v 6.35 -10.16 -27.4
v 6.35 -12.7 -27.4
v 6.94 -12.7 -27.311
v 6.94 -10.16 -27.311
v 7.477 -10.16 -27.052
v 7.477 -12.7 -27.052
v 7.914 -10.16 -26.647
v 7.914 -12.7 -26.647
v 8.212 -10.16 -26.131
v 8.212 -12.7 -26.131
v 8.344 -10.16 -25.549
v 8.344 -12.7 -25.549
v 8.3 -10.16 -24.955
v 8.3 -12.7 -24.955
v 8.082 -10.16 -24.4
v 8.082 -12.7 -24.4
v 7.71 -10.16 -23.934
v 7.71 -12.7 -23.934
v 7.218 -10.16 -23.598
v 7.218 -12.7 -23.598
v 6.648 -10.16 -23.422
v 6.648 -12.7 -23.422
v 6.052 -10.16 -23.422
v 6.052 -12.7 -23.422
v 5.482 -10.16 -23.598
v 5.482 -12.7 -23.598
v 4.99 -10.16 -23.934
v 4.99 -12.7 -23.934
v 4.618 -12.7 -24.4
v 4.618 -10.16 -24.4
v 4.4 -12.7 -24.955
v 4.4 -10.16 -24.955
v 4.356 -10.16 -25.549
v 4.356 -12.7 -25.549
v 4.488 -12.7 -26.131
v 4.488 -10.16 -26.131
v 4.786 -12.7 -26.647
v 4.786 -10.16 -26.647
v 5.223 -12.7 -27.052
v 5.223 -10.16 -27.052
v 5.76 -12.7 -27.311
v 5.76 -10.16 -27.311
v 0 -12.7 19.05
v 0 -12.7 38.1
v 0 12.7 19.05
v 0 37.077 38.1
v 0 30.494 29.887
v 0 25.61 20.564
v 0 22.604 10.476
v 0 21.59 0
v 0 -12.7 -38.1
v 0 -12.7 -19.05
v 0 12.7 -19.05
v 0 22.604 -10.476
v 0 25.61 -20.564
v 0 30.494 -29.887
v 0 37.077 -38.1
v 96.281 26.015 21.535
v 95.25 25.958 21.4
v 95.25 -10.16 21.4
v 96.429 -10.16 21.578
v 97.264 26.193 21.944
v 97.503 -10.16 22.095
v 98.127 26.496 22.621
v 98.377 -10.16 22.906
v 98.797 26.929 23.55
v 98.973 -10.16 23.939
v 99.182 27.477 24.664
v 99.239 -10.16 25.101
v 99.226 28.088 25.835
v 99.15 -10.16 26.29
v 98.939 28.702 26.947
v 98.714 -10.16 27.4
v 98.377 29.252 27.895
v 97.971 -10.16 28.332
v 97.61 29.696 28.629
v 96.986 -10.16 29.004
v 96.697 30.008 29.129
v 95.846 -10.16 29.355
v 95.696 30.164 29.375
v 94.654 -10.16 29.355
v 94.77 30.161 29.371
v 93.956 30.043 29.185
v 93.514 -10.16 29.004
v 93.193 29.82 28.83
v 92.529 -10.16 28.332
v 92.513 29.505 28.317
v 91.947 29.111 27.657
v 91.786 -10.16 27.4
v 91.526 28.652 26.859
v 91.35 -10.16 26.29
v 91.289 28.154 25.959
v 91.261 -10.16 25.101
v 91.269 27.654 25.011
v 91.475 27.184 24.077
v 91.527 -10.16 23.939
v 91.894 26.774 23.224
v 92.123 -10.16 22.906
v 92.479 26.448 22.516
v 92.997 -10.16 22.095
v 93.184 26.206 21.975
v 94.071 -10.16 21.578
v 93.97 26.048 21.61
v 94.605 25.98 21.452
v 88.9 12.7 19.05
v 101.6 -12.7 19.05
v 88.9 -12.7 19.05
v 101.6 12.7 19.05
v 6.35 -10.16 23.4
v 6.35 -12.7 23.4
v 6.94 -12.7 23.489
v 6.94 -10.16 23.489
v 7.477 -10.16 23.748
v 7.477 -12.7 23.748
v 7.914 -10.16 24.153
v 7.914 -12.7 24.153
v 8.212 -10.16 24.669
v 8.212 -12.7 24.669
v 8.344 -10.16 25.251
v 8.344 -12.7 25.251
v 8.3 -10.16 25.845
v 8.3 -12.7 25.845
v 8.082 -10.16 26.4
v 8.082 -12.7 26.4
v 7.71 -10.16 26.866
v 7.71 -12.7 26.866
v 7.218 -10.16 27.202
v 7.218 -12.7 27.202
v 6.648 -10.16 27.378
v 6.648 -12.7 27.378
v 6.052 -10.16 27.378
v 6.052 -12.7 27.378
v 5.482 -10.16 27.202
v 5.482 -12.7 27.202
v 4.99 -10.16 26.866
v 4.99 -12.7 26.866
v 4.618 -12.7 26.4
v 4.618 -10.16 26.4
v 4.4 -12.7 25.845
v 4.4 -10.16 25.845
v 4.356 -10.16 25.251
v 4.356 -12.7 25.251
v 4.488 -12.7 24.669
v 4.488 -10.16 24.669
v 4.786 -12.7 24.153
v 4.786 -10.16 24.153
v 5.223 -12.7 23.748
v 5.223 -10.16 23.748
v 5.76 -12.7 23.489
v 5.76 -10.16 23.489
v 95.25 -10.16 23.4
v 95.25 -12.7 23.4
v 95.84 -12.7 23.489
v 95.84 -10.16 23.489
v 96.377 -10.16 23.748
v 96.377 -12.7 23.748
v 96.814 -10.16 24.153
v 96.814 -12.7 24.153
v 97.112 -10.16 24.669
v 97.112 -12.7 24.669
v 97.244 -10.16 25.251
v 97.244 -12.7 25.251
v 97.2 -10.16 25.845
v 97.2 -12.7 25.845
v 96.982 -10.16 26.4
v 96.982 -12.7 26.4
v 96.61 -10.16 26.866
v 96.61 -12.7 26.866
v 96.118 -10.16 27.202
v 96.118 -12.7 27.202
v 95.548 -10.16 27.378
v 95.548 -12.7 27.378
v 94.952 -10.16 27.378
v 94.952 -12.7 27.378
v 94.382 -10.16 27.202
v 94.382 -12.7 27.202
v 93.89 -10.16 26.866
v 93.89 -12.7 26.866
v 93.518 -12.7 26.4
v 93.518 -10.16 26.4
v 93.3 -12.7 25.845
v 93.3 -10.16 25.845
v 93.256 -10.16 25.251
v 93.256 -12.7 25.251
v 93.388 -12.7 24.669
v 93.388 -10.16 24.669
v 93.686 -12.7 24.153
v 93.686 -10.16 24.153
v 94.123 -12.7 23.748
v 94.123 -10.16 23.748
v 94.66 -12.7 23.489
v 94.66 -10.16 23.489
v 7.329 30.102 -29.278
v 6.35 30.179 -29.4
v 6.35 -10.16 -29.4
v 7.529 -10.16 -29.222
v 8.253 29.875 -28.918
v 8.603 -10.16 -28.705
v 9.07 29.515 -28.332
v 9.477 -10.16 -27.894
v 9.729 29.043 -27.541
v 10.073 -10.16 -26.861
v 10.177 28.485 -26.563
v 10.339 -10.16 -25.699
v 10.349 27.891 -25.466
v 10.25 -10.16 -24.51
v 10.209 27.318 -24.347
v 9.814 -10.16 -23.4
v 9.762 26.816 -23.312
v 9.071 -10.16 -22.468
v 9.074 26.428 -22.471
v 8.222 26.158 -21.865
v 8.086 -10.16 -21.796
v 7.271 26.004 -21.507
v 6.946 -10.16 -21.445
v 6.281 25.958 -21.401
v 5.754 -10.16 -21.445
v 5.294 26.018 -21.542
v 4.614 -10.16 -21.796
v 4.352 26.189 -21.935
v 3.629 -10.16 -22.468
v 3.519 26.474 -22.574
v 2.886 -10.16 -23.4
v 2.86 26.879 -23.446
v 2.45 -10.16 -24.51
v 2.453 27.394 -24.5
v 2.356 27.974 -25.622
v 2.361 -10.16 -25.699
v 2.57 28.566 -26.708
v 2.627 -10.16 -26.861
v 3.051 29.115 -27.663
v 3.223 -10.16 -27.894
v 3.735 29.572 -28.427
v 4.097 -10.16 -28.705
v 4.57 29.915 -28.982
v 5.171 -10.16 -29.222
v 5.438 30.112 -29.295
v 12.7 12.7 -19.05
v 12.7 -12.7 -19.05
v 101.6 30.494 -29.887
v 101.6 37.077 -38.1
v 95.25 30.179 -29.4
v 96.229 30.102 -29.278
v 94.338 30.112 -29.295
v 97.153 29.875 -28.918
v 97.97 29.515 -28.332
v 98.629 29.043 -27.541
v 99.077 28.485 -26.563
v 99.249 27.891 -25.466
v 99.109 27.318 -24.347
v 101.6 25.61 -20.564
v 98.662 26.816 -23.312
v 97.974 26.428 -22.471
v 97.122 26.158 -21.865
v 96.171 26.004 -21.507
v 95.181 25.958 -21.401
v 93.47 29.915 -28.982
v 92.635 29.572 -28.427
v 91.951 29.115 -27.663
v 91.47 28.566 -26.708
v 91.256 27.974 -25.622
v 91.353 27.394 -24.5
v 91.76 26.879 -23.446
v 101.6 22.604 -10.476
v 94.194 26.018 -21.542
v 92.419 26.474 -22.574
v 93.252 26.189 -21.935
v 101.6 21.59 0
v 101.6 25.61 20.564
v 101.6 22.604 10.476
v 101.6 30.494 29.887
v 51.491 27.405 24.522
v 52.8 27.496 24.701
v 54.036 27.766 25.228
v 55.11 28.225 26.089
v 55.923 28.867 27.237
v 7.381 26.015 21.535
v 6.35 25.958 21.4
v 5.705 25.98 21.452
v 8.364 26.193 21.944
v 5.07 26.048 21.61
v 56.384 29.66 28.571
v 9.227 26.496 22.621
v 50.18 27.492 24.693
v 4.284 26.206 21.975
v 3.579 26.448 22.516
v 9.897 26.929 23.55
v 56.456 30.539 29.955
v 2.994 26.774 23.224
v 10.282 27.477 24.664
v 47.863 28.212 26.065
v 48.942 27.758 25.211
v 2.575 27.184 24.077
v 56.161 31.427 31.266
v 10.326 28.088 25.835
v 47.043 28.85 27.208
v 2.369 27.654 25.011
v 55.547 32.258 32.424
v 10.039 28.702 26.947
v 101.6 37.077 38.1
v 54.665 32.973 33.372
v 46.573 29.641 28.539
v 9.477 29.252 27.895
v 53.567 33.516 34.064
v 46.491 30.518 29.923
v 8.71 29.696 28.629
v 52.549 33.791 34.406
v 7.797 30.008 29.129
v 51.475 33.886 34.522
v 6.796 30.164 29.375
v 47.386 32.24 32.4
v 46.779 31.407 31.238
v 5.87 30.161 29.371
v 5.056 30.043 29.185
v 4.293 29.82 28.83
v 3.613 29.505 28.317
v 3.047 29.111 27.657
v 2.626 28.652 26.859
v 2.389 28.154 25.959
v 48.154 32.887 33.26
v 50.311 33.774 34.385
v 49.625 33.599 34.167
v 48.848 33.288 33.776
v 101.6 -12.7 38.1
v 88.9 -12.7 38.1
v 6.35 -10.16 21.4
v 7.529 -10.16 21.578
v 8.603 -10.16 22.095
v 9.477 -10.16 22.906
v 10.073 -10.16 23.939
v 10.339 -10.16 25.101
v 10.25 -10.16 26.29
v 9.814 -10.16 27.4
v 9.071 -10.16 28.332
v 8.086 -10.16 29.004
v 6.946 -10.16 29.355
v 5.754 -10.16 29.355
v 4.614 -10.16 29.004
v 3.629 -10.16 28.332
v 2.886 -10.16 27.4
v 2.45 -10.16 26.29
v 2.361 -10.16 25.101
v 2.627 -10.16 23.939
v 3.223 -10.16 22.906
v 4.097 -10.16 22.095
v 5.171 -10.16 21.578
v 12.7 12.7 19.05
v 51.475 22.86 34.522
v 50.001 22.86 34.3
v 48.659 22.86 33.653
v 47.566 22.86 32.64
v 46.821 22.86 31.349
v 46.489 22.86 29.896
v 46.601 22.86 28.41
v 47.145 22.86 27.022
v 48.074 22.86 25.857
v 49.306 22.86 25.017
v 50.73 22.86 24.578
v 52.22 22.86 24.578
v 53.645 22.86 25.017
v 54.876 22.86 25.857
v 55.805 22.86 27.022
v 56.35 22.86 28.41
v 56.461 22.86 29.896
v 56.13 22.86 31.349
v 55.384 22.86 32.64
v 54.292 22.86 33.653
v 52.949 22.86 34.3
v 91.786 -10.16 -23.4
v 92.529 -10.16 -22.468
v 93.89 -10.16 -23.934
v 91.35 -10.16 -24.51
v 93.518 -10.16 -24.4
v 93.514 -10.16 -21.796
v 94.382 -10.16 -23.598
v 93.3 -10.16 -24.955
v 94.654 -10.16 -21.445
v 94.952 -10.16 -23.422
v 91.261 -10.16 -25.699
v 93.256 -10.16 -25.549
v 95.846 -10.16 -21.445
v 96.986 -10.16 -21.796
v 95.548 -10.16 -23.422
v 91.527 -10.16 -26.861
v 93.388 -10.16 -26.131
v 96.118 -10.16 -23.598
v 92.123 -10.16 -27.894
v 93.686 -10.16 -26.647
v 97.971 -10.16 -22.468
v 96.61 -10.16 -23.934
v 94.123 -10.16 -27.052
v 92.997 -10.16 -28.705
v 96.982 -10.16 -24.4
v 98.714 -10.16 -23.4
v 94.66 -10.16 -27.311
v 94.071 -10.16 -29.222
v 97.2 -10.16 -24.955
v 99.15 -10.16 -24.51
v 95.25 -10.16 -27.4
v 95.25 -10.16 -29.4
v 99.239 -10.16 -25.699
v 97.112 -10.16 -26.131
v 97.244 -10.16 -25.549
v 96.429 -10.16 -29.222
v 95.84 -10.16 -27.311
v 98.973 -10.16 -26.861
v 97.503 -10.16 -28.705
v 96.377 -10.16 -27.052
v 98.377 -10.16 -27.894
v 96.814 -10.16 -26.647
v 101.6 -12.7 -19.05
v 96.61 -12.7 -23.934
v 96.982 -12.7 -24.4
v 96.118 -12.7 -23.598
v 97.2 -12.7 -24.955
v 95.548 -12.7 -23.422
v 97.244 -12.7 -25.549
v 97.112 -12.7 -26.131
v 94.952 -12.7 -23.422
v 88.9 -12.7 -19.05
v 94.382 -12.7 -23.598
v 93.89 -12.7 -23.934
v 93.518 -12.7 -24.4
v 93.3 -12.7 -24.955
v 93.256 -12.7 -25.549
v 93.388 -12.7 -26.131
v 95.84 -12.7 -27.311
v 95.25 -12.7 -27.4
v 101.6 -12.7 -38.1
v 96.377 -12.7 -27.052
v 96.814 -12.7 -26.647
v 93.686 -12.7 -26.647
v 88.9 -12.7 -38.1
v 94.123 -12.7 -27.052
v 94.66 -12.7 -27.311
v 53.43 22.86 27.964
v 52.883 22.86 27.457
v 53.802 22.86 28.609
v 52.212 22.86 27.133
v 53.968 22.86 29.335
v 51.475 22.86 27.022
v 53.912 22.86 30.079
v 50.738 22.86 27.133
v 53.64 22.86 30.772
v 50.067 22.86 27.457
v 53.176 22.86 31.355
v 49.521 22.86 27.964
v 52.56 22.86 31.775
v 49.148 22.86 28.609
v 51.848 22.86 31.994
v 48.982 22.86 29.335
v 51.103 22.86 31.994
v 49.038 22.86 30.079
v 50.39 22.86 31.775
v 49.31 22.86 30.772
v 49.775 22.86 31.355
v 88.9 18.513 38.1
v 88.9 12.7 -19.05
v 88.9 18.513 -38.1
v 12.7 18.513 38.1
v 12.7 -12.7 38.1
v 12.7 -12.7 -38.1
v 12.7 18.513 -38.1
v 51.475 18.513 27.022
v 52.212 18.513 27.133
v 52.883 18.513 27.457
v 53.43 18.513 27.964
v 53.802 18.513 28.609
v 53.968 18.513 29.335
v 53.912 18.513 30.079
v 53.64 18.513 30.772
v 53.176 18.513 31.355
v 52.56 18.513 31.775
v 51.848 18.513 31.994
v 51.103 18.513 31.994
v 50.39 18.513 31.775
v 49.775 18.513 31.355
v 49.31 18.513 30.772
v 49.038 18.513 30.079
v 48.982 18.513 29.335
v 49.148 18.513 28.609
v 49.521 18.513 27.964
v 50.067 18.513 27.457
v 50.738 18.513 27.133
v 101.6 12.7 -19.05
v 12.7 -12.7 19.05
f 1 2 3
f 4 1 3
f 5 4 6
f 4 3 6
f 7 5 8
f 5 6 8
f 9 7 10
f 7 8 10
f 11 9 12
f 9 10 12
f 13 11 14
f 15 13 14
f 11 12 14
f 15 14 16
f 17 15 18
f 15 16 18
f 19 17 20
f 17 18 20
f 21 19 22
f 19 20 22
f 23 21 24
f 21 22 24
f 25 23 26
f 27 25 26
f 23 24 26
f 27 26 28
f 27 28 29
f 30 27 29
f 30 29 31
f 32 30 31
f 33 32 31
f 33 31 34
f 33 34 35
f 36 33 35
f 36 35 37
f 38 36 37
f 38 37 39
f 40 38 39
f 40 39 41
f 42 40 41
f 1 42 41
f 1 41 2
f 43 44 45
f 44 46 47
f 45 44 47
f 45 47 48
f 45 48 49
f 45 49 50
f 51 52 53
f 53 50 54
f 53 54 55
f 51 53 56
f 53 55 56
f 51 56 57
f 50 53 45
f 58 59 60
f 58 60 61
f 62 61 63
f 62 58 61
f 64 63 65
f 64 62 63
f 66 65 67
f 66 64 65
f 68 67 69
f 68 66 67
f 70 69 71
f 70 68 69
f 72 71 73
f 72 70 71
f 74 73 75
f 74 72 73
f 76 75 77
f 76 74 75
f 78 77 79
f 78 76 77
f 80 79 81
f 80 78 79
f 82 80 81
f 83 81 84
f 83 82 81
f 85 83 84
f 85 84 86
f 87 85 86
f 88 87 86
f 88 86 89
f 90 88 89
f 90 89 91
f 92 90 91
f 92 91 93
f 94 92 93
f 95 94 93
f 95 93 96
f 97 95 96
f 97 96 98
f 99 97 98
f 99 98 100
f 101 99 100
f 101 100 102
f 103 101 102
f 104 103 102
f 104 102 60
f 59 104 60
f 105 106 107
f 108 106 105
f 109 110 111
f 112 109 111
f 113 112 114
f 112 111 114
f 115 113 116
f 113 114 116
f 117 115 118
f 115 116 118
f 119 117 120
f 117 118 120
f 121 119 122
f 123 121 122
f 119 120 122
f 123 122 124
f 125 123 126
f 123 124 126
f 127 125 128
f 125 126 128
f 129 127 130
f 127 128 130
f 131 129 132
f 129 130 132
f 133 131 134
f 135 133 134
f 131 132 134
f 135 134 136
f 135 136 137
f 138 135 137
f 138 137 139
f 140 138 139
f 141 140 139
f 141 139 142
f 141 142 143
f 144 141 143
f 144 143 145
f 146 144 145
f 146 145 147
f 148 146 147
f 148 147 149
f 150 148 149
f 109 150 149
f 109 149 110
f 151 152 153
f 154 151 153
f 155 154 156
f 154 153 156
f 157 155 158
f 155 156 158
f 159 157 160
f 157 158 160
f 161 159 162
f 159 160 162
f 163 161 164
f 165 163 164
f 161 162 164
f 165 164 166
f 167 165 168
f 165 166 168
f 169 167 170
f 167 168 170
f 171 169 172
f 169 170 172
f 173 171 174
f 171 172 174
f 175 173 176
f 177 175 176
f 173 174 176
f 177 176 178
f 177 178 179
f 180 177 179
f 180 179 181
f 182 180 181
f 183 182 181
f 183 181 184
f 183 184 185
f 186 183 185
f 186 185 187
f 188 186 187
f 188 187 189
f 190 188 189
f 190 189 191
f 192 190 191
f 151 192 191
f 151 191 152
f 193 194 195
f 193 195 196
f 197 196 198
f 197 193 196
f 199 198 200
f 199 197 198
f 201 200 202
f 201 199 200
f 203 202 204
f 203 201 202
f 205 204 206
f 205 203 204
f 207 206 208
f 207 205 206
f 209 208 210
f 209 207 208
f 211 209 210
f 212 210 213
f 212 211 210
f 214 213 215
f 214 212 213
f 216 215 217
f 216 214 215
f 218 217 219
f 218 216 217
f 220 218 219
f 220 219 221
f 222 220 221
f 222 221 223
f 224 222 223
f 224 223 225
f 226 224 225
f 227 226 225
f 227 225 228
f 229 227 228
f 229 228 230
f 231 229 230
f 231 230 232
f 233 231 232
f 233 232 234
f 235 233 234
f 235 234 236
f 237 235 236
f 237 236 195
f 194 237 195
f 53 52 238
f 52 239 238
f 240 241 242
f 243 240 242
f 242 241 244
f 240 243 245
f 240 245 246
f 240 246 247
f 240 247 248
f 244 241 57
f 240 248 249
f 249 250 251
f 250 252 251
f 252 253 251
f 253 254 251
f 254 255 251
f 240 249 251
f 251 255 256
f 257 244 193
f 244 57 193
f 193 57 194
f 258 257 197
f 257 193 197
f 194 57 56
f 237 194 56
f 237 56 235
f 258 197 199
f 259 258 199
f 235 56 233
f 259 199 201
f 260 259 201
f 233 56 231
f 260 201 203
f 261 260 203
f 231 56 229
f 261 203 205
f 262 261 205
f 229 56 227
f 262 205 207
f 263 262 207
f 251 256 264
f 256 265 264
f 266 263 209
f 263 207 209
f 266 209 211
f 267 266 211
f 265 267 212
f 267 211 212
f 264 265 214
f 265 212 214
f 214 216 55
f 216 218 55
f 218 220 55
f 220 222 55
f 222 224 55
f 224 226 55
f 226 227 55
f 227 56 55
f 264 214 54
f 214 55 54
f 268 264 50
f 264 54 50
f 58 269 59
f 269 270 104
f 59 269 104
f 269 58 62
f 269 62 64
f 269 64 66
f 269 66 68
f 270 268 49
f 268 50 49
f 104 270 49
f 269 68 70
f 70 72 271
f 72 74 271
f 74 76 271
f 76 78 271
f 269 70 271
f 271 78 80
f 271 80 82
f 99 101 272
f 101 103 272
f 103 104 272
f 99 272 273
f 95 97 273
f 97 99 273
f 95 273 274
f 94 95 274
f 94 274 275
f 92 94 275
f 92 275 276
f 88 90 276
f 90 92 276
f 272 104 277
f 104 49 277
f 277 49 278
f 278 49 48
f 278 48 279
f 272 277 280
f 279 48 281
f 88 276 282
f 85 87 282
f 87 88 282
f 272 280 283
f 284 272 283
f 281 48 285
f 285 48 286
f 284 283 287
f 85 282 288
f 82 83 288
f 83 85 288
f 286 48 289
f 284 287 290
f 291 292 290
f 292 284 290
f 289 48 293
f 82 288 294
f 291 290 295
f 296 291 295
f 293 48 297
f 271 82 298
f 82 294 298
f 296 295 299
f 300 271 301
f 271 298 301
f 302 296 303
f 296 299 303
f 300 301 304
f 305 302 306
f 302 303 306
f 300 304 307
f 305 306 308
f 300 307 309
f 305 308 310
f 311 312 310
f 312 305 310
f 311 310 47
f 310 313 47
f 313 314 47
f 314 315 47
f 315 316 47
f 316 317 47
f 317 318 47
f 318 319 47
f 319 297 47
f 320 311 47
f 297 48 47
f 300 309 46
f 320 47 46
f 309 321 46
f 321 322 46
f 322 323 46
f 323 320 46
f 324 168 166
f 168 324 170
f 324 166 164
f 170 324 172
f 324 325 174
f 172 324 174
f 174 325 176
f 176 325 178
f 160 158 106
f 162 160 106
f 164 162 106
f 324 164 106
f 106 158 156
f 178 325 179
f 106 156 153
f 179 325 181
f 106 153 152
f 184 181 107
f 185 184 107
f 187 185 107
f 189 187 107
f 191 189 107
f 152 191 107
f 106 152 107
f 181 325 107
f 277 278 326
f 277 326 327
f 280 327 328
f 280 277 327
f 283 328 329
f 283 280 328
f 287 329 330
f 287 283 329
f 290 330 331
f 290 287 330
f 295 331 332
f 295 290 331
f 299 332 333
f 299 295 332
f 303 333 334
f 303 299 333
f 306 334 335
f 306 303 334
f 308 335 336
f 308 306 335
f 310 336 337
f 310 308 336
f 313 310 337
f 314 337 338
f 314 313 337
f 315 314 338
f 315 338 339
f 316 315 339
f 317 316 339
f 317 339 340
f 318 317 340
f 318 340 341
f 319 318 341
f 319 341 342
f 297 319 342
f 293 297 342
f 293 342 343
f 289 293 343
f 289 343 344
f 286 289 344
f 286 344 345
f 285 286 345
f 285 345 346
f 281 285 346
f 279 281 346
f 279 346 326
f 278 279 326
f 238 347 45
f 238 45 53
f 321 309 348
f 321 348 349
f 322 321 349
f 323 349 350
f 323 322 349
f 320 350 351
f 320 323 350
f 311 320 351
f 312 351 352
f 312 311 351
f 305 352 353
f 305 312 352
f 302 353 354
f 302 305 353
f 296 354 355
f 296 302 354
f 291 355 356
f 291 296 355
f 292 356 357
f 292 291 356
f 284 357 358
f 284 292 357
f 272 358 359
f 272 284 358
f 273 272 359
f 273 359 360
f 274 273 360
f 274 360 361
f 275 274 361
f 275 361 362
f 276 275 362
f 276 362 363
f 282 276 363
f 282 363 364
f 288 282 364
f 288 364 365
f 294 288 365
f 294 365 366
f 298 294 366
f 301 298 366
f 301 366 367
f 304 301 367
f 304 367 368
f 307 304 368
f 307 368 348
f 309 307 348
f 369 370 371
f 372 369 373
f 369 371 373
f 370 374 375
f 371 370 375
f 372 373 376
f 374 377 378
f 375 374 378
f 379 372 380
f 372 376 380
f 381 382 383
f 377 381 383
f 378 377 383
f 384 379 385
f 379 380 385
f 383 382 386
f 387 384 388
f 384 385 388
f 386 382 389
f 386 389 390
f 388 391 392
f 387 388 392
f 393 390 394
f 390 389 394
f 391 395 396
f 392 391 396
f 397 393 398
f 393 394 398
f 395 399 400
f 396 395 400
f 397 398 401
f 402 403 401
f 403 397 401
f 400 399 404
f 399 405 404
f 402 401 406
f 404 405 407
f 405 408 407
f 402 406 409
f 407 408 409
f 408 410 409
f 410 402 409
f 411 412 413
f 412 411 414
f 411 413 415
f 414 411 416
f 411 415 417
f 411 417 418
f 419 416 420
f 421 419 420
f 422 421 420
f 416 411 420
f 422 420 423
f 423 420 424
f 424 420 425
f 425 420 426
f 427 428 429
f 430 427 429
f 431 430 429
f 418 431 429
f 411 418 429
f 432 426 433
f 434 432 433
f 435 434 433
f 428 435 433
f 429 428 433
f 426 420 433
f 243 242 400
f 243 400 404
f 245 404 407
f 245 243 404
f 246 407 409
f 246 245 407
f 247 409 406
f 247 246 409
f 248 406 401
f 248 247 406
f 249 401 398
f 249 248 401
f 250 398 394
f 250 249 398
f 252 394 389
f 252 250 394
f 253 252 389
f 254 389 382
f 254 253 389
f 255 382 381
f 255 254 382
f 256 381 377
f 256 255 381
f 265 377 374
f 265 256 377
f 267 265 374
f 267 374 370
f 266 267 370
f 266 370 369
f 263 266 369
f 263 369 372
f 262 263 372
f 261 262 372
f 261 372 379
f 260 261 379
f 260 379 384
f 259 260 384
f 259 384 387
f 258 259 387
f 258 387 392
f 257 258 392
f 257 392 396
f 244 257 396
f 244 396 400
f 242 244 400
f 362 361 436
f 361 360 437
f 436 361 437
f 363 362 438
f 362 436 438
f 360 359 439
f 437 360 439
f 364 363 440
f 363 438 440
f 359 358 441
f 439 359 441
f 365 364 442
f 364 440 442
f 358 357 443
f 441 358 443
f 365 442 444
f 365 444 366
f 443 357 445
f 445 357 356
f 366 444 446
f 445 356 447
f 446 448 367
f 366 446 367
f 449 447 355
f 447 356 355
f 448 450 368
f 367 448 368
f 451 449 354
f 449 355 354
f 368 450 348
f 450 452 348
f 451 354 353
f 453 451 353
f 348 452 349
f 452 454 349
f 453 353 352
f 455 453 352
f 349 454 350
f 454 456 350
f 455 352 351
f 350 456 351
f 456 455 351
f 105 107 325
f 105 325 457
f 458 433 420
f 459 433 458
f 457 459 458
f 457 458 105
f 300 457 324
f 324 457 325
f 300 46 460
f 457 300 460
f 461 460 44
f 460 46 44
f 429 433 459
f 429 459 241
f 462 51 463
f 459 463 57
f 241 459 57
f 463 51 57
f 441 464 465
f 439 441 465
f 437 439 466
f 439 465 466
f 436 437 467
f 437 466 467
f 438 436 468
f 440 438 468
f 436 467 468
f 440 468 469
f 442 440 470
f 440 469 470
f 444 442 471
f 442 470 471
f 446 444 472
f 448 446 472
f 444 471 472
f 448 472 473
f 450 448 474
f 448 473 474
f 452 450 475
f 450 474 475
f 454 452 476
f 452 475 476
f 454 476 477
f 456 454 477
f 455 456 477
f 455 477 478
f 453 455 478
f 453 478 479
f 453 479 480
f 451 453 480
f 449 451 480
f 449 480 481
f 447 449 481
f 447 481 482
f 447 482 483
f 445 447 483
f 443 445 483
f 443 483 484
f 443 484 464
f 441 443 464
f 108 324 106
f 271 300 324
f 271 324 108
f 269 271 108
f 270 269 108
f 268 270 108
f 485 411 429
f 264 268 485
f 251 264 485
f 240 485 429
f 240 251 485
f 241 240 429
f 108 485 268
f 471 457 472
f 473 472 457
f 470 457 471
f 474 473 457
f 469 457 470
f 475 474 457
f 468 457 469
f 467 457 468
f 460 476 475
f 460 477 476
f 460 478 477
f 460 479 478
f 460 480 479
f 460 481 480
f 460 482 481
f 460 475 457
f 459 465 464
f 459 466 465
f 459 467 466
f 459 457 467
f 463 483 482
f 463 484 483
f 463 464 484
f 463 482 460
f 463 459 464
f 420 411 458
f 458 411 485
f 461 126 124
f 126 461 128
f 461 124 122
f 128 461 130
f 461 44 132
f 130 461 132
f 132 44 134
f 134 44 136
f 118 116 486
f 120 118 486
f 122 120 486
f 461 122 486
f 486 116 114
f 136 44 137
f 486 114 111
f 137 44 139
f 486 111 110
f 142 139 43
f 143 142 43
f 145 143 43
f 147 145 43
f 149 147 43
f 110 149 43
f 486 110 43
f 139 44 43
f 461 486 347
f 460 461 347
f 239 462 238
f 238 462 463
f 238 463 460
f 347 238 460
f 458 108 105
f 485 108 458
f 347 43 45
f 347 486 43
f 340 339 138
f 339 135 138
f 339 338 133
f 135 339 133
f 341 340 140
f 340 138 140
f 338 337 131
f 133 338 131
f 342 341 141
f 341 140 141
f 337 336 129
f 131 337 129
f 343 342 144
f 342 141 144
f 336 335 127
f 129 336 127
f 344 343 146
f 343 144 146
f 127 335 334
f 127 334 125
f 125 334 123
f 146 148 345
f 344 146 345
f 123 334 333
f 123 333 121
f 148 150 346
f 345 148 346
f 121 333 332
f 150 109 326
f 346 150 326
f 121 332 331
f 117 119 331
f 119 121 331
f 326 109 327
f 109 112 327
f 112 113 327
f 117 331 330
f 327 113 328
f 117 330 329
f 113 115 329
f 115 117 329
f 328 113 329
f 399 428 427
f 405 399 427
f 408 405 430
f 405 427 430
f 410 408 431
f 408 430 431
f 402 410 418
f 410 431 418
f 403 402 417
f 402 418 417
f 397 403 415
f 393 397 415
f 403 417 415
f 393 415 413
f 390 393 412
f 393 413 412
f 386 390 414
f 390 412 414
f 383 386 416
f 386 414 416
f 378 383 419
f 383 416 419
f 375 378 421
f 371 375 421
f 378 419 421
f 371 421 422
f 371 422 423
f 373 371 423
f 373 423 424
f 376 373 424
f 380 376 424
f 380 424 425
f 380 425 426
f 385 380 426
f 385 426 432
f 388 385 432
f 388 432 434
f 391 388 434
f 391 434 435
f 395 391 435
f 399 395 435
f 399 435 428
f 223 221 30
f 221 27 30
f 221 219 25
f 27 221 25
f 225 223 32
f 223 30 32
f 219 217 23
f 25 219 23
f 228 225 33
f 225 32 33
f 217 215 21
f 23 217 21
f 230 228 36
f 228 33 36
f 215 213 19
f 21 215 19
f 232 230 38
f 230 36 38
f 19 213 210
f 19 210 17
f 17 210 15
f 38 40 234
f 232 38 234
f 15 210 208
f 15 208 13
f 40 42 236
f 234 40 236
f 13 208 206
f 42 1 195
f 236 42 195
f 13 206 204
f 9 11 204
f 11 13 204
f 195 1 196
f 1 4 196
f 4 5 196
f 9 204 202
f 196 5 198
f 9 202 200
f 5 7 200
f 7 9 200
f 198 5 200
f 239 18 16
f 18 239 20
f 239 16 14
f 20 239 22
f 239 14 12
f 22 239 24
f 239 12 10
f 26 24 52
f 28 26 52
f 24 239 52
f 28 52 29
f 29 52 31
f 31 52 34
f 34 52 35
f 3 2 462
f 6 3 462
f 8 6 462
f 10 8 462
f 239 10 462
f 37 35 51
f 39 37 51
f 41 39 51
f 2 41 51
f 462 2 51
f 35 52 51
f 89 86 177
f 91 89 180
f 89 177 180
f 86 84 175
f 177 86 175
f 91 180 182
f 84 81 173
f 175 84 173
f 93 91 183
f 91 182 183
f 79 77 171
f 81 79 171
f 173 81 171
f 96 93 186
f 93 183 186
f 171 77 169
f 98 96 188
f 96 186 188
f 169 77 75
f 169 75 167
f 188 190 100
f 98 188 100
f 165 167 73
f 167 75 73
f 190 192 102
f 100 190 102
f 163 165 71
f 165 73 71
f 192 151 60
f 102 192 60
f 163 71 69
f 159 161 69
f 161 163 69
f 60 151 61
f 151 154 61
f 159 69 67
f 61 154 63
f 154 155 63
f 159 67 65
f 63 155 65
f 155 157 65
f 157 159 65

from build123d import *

# Parameters (mm, degrees)
BOSS_EXTRUDE1_DEPTH     = 101.6
SKETCH2_R               = 2
CUT_EXTRUDE1_DEPTH      = 120.381228758
SKETCH3_W               = 76.2
SKETCH3_H               = 62.425931944
CUT_EXTRUDE2_DEPTH      = 133.301446423
BOSS_EXTRUDE2_START     = -76.2
BOSS_EXTRUDE2_DEPTH     = 76.2
CUT_EXTRUDE3_DEPTH      = 27.94
CUT_EXTRUDE3_DEPTH_BACK = 19.05
SKETCH5_R               = 4
SKETCH6_W               = 38.1
SKETCH6_H               = 50.8
CUT_EXTRUDE4_DEPTH      = 115.668403311
SKETCH9_R               = 5
CUT_EXTRUDE6_DEPTH      = 15.24
SKETCH10_R              = 2.5
CUT_EXTRUDE7_DEPTH      = 113.708475404


with BuildPart() as part:
    # Sketch1 → Boss-Extrude1 (new body)
    with BuildSketch(Plane(origin=(0, 0, 0), x_dir=(0, 0, -1), z_dir=(1, 0, 0))):
        with BuildLine():
            Line((-38.1, 37.076578626), (-38.1, -12.7))
            Line((-38.1, -12.7), (38.1, -12.7))
            Line((38.1, -12.7), (38.1, 37.076578626))
            ThreePointArc((38.1, 37.076578626), (0, 21.59), (-38.1, 37.076578626))
        make_face()
    extrude(amount=BOSS_EXTRUDE1_DEPTH)

    # Sketch2 → Cut-Extrude1 (cut, through all)
    with BuildSketch(Plane(origin=(0, -12.7, 0), x_dir=(-1, 0, 0), z_dir=(0, -1, 0))):
        with Locations(Location((-6.35, -25.4, 0), (0, 0, 90))):
            Circle(SKETCH2_R)
        with Locations(Location((-6.35, 25.4, 0), (0, 0, 90))):
            Circle(SKETCH2_R)
        with Locations(Location((-95.25, -25.4, 0), (0, 0, 90))):
            Circle(SKETCH2_R)
        with Locations(Location((-95.25, 25.4, 0), (0, 0, 90))):
            Circle(SKETCH2_R)
    extrude(amount=-CUT_EXTRUDE1_DEPTH, mode=Mode.SUBTRACT)

    # Sketch3 → Cut-Extrude2 (cut, through all)
    with BuildSketch(Plane(origin=(0, 0, -38.1), x_dir=(-1, 0, 0), z_dir=(0, 0, -1))):
        with Locations((-50.8, -12.7)):
            Rectangle(SKETCH3_W, SKETCH3_H)
    extrude(amount=-CUT_EXTRUDE2_DEPTH, mode=Mode.SUBTRACT)

    # Sketch4 → Boss-Extrude2 (add)
    with BuildSketch(Plane(origin=(101.6, 0, 0), x_dir=(0, 0, -1), z_dir=(1, 0, 0)).offset(BOSS_EXTRUDE2_START)):
        with BuildLine():
            Line((-38.1, 37.076578626), (-38.1, 33.602905029))
            ThreePointArc((-38.1, 33.602905029), (0, 19.05), (38.1, 33.602905029))
            Line((38.1, 33.602905029), (38.1, 37.076578626))
            ThreePointArc((38.1, 37.076578626), (0, 21.59), (-38.1, 37.076578626))
        make_face()
    extrude(amount=BOSS_EXTRUDE2_DEPTH)

    # Sketch5 → Cut-Extrude3 (cut, two sides: drawn at the far end of the back side and taken through both)
    with BuildSketch(Plane(origin=(0, 17.78, 0), x_dir=(-1, 0, 0), z_dir=(0, -1, 0)).offset(-CUT_EXTRUDE3_DEPTH_BACK)):
        with Locations(Location((-95.25, 25.4, 0), (0, 0, 90))):
            Circle(SKETCH5_R)
        with Locations(Location((-6.35, 25.4, 0), (0, 0, 90))):
            Circle(SKETCH5_R)
        with Locations(Location((-6.35, -25.4, 0), (0, 0, 90))):
            Circle(SKETCH5_R)
        with Locations(Location((-95.25, -25.4, 0), (0, 0, 90))):
            Circle(SKETCH5_R)
    extrude(amount=CUT_EXTRUDE3_DEPTH + CUT_EXTRUDE3_DEPTH_BACK, mode=Mode.SUBTRACT)

    # Sketch6 → Cut-Extrude4 (cut, through all)
    with BuildSketch(Plane(origin=(101.6, 0, 0), x_dir=(0, 0, -1), z_dir=(1, 0, 0))):
        with Locations((0, -12.7)):
            Rectangle(SKETCH6_W, SKETCH6_H)
    extrude(amount=-CUT_EXTRUDE4_DEPTH, mode=Mode.SUBTRACT)

    # Sketch9 → Cut-Extrude6 (cut)
    with BuildSketch(Plane(origin=(0, 38.1, 0), x_dir=(-1, 0, 0), z_dir=(0, -1, 0))):
        with Locations(Location((-51.475148777, -29.522267927, 0), (0, 0, 270))):
            Circle(SKETCH9_R)
    extrude(amount=CUT_EXTRUDE6_DEPTH, mode=Mode.SUBTRACT)

    # Sketch10 → Cut-Extrude7 (cut, through all)
    with BuildSketch(Plane(origin=(0, 17.78, 0), x_dir=(-1, 0, 0), z_dir=(0, -1, 0))):
        with Locations(Location((-51.475148777, -29.522267927, 0), (0, 0, 90))):
            Circle(SKETCH10_R)
    extrude(amount=-CUT_EXTRUDE7_DEPTH, mode=Mode.SUBTRACT)


solid = part.part
